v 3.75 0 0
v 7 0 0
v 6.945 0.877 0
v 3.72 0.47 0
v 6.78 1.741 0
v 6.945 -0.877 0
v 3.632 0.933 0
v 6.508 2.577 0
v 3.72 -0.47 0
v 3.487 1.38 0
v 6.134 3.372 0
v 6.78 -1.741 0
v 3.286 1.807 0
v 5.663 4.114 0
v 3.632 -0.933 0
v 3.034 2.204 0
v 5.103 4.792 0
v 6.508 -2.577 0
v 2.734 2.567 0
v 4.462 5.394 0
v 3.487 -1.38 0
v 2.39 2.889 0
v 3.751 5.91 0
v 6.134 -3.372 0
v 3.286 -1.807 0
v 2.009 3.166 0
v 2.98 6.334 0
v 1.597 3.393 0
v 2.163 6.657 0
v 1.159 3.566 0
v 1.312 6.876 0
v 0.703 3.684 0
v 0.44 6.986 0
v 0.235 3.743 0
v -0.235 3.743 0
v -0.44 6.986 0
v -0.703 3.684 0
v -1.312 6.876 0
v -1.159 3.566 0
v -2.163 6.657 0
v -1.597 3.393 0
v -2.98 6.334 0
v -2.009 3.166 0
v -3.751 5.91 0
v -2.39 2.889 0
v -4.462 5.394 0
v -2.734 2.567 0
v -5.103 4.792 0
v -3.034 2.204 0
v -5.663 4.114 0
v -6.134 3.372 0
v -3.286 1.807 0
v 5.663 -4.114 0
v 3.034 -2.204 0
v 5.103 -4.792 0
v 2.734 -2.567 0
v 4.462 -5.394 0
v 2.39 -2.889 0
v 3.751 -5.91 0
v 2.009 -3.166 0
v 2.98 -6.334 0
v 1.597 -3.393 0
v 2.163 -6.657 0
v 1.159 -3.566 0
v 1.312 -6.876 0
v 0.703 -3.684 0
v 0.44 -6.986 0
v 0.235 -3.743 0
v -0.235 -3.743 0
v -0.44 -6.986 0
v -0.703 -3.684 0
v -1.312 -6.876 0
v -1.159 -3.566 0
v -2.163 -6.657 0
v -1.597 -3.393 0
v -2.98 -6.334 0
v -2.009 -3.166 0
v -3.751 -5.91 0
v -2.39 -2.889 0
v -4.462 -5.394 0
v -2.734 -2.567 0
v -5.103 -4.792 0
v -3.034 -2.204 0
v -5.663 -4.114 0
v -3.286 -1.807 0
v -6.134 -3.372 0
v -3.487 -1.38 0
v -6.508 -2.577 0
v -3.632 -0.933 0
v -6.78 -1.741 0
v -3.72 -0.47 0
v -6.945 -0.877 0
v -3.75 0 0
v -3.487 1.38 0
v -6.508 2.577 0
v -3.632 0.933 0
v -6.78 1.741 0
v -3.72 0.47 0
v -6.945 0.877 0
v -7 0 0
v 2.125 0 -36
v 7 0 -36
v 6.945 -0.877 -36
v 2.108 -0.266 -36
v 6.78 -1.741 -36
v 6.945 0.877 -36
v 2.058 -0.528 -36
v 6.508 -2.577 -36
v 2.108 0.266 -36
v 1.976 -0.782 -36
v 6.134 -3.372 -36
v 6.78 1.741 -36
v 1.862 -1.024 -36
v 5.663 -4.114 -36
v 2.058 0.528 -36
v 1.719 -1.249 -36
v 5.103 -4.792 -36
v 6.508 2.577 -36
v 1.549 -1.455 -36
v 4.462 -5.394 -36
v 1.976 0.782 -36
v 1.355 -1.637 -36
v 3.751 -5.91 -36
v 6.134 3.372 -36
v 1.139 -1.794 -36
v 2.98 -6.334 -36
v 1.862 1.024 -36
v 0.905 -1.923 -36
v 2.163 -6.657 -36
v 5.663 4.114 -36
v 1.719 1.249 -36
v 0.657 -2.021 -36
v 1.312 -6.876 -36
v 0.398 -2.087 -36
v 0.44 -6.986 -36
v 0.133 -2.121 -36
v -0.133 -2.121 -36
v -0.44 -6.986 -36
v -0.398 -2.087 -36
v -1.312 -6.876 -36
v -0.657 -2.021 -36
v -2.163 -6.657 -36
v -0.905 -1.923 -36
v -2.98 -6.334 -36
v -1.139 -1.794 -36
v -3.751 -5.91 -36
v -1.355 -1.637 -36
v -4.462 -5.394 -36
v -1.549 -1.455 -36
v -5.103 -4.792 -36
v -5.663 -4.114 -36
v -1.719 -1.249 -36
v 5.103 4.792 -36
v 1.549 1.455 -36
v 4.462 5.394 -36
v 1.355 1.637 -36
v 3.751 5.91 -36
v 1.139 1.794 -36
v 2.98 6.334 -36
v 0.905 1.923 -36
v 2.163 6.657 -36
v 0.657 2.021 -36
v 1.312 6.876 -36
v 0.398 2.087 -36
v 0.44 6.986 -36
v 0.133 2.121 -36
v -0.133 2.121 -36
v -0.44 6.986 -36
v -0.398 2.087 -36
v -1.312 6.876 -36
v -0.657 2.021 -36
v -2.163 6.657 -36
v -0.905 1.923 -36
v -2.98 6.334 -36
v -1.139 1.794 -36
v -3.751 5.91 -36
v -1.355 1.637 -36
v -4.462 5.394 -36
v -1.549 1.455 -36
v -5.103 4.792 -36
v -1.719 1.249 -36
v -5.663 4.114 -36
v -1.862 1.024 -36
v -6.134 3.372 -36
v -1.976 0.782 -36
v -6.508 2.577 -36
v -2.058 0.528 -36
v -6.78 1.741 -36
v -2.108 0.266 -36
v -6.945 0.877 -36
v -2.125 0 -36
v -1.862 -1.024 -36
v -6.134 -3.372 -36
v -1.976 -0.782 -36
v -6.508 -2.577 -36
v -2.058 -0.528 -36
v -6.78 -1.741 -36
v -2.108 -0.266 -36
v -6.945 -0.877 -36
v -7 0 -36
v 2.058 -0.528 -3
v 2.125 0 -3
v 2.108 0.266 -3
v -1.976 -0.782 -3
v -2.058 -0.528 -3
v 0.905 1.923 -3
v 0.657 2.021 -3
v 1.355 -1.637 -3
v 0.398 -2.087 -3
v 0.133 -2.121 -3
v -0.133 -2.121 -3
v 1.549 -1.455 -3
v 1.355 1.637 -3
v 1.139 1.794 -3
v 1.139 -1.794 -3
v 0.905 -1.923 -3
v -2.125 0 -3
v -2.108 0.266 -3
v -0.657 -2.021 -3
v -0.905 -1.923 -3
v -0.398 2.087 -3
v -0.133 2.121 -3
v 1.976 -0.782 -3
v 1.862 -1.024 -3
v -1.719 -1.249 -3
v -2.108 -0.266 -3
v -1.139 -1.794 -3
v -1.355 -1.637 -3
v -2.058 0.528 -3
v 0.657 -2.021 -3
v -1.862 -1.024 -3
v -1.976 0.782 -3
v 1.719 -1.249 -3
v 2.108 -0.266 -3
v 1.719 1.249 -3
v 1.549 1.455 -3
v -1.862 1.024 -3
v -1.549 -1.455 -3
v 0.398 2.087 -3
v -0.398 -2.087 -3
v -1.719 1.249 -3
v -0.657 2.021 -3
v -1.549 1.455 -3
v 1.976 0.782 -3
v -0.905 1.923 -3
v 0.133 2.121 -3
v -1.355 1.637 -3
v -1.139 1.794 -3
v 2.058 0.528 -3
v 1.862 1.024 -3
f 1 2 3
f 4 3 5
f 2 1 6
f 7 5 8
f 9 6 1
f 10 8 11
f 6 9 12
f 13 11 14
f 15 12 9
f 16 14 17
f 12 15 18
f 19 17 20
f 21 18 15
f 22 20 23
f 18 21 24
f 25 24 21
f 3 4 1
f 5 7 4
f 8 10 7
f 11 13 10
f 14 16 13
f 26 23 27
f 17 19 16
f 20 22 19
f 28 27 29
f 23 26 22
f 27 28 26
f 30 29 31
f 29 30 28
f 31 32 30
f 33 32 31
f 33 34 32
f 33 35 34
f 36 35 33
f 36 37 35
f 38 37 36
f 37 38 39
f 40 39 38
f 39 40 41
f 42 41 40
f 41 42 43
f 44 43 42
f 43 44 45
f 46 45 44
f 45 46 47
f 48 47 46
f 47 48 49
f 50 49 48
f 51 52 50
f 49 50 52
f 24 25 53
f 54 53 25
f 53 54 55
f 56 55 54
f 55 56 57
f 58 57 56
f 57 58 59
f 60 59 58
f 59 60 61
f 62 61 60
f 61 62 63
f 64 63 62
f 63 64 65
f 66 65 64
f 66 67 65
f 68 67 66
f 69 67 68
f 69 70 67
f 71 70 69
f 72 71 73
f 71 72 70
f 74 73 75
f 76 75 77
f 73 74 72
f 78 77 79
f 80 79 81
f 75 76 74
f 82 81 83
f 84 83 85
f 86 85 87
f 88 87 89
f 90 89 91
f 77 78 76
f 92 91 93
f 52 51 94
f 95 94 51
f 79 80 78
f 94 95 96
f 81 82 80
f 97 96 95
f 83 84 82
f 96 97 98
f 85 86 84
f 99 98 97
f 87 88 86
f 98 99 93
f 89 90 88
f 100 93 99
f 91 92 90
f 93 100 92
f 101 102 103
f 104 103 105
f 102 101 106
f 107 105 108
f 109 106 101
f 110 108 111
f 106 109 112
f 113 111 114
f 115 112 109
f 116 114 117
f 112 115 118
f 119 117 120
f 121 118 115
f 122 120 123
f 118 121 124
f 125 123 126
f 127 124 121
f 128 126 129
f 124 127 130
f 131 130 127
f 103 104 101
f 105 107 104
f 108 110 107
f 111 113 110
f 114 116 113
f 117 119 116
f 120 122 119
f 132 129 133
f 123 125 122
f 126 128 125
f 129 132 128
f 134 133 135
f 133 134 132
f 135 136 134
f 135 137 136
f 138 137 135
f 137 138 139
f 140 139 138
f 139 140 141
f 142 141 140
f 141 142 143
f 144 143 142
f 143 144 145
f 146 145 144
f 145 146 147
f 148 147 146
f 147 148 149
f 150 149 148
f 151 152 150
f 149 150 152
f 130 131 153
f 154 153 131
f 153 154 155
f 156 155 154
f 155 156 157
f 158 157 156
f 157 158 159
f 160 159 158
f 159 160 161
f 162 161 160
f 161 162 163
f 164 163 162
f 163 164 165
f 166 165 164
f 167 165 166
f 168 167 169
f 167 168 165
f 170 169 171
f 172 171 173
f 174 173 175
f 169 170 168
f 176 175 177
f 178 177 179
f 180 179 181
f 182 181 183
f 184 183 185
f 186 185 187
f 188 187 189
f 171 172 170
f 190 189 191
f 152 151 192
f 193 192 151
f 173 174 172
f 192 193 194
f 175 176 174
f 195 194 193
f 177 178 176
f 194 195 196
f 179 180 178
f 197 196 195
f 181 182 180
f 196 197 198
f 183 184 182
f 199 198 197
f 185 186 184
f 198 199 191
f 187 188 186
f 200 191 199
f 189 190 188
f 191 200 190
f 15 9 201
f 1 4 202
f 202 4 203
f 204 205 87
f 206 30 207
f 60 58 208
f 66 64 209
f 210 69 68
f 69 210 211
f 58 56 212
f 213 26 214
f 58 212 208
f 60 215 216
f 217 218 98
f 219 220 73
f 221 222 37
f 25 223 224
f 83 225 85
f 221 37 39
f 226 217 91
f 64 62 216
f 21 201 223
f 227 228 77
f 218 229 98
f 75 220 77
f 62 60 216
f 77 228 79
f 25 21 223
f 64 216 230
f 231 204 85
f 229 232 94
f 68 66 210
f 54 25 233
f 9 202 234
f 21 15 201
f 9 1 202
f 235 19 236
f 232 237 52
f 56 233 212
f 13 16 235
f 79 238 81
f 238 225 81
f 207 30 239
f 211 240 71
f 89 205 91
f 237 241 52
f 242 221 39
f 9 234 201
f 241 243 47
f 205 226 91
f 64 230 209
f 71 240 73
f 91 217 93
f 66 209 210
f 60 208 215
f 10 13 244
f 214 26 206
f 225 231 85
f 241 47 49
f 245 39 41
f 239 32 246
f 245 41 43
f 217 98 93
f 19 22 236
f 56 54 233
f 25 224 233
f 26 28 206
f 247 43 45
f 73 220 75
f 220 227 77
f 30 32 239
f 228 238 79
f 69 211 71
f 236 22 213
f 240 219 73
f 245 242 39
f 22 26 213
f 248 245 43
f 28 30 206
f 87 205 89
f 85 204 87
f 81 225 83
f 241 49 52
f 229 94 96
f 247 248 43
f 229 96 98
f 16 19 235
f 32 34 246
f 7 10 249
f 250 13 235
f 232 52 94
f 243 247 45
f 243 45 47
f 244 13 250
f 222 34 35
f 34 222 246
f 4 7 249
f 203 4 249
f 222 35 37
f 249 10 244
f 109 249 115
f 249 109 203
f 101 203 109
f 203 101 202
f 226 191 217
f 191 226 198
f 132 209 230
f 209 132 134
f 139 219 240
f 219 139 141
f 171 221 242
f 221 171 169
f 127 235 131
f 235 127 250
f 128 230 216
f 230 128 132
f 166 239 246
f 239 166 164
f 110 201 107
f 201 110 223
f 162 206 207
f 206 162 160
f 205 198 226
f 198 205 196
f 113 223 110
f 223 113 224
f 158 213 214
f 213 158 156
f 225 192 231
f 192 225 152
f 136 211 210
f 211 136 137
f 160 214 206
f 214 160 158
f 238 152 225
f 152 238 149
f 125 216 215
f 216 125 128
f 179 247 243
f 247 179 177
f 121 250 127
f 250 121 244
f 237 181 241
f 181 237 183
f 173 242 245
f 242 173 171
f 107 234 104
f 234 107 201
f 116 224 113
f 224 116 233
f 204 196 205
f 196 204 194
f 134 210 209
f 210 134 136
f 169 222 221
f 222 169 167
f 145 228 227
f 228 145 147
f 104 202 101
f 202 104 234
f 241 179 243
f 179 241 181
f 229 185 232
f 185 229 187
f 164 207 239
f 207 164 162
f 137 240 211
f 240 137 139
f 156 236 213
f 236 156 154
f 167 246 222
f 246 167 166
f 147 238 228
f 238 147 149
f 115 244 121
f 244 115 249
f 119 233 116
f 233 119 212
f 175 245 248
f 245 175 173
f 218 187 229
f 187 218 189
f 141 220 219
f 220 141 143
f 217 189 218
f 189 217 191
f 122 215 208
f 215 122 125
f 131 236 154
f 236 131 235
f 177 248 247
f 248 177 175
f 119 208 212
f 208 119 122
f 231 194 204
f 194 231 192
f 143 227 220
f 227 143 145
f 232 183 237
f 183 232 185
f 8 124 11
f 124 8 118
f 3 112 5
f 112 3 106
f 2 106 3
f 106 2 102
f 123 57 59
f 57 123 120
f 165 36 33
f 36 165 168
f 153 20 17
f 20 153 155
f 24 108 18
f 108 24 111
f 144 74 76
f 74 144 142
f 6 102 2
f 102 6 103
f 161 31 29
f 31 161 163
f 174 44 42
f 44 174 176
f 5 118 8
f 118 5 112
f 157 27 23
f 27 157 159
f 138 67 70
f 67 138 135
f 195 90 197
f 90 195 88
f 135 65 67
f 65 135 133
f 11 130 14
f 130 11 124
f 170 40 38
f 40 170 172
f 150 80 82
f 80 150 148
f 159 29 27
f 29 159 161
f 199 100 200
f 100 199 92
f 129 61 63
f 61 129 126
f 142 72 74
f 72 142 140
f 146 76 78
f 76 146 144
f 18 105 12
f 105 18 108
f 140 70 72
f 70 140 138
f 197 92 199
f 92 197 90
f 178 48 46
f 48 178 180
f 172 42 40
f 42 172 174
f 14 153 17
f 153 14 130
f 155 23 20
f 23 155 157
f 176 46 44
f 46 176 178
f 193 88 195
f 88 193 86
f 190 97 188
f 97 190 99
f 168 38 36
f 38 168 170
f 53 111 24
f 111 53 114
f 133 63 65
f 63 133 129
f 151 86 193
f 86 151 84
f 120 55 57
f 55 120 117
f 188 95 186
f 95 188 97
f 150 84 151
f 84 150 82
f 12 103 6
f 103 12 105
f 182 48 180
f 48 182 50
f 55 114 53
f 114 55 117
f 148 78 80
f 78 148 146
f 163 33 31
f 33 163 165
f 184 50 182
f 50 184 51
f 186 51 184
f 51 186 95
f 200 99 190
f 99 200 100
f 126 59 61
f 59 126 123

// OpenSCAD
$fn = 50;


difference() {
	union() {
		translate(v = [0, 0, -36.0000000000]) {
			cylinder(h = 36, r = 7.0000000000);
		}
		cylinder(h = 0, r = 13.0000000000);
	}
	union() {
		translate(v = [0, 0, 0]) {
			rotate(a = [0, 0, 0]) {
				difference() {
					union() {
						#translate(v = [0, 0, -36.0000000000]) {
							cylinder(h = 36, r = 2.0000000000);
						}
						#translate(v = [0, 0, -3]) {
							cylinder(h = 3, r = 7.0000000000, r1 = 2.1250000000, r2 = 3.7500000000);
						}
						#translate(v = [0, 0, -36.0000000000]) {
							cylinder(h = 36, r = 2.1250000000);
						}
						#translate(v = [0, 0, -36.0000000000]) {
							cylinder(h = 36, r = 2.0000000000);
						}
					}
					union();
				}
			}
		}
	}
}
